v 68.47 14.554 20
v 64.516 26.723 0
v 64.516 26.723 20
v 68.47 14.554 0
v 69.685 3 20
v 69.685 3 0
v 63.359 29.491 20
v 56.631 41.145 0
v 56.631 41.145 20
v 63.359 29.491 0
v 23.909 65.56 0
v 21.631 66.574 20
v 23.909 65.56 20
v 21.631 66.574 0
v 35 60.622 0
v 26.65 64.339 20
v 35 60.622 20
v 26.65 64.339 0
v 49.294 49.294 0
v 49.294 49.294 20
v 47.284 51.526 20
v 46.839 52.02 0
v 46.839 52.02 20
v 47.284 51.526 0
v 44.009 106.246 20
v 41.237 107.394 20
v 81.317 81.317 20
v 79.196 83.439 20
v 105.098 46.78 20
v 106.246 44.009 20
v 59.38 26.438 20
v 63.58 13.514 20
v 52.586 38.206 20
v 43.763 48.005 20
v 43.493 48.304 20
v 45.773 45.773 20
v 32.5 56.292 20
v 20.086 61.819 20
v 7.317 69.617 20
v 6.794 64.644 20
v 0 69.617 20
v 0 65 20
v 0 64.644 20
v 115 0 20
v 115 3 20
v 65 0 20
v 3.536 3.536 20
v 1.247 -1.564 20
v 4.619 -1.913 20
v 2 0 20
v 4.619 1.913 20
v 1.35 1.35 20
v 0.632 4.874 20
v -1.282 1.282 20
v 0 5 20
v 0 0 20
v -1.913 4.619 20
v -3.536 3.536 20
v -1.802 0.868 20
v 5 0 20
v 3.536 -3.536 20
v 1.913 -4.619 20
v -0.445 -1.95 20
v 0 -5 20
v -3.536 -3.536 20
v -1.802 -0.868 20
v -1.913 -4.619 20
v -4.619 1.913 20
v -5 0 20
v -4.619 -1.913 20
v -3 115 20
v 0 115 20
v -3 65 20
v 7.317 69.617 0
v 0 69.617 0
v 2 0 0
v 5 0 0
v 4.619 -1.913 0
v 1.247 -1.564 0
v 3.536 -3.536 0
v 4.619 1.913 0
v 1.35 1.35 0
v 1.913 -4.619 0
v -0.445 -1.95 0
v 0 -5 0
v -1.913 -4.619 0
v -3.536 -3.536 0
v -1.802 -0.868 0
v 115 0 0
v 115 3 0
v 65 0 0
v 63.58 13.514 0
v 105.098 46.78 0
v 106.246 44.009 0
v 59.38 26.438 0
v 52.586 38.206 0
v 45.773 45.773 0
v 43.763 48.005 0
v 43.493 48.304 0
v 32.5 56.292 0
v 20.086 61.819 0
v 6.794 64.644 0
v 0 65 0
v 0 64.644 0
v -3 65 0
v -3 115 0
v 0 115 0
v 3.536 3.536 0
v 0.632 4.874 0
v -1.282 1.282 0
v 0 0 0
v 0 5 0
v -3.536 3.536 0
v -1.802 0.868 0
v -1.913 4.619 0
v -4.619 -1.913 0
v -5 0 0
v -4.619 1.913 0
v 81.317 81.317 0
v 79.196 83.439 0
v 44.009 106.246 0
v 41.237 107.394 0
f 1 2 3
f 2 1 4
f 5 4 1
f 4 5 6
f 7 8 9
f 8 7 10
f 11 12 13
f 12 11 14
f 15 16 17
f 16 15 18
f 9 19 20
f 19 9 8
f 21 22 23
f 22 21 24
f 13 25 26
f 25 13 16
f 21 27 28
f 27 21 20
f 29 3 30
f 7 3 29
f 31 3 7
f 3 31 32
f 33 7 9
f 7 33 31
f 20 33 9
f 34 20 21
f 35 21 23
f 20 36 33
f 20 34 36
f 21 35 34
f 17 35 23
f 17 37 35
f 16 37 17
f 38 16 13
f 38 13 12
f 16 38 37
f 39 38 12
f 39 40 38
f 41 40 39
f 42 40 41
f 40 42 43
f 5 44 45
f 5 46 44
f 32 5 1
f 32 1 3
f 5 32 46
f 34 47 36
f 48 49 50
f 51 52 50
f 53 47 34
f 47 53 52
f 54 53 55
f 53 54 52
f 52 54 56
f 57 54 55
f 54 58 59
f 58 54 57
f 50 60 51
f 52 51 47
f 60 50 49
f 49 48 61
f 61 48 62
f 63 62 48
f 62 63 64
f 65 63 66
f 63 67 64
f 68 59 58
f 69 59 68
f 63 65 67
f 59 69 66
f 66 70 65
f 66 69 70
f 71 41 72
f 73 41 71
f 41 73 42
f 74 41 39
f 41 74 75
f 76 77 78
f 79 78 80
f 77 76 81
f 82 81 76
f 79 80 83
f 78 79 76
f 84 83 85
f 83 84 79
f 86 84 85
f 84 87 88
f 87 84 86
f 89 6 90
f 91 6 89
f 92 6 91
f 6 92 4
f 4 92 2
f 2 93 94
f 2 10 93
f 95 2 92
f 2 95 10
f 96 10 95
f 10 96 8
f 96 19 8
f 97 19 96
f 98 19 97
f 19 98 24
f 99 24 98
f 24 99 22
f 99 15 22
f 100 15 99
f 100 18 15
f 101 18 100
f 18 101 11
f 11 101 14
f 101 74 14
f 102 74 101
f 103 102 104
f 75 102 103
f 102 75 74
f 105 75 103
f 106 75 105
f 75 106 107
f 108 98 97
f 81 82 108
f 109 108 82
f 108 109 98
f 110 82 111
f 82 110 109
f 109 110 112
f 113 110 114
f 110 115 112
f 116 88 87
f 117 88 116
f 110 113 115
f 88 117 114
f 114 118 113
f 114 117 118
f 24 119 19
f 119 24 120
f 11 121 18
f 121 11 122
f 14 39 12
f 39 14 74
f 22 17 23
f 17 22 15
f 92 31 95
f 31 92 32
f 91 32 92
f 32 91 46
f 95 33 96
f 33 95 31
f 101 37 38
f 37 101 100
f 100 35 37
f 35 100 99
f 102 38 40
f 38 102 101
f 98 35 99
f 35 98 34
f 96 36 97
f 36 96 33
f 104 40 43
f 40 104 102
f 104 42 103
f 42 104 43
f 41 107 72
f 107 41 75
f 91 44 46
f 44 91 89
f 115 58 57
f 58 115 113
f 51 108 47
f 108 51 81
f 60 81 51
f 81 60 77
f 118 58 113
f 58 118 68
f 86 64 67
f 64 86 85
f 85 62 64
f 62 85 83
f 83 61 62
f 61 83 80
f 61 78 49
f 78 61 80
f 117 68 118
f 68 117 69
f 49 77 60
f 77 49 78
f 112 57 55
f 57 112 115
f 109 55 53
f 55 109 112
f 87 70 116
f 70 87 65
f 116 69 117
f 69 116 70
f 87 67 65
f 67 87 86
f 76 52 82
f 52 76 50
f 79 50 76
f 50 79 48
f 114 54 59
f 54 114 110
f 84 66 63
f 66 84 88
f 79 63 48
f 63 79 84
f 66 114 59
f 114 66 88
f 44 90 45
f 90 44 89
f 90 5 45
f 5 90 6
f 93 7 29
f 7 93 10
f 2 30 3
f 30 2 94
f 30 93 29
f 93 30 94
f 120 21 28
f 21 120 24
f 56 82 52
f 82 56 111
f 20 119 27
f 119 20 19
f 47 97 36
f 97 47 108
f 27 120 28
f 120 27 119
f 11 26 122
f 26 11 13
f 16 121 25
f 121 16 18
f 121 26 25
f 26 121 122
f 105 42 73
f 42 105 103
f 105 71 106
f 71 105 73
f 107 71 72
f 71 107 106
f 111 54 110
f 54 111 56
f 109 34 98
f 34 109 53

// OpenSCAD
module courbe() {
	intersection() {
		difference() {
			cylinder(20, r=70);
			cylinder(20, r=65);
		}
		cube([70, 70, 20]);
    }
    difference() {
        cylinder(20, r=5);
        cylinder(20, r=2);
    }
}

module pales() {
	for (i=[0:1:4]){
		rotate([0,0,90*i/4])
			translate([65,0,0])
				cube([50,3,20]);
	}
	rotate([0,0,45])cube([65,3,20]);
}
				
courbe();
pales();
